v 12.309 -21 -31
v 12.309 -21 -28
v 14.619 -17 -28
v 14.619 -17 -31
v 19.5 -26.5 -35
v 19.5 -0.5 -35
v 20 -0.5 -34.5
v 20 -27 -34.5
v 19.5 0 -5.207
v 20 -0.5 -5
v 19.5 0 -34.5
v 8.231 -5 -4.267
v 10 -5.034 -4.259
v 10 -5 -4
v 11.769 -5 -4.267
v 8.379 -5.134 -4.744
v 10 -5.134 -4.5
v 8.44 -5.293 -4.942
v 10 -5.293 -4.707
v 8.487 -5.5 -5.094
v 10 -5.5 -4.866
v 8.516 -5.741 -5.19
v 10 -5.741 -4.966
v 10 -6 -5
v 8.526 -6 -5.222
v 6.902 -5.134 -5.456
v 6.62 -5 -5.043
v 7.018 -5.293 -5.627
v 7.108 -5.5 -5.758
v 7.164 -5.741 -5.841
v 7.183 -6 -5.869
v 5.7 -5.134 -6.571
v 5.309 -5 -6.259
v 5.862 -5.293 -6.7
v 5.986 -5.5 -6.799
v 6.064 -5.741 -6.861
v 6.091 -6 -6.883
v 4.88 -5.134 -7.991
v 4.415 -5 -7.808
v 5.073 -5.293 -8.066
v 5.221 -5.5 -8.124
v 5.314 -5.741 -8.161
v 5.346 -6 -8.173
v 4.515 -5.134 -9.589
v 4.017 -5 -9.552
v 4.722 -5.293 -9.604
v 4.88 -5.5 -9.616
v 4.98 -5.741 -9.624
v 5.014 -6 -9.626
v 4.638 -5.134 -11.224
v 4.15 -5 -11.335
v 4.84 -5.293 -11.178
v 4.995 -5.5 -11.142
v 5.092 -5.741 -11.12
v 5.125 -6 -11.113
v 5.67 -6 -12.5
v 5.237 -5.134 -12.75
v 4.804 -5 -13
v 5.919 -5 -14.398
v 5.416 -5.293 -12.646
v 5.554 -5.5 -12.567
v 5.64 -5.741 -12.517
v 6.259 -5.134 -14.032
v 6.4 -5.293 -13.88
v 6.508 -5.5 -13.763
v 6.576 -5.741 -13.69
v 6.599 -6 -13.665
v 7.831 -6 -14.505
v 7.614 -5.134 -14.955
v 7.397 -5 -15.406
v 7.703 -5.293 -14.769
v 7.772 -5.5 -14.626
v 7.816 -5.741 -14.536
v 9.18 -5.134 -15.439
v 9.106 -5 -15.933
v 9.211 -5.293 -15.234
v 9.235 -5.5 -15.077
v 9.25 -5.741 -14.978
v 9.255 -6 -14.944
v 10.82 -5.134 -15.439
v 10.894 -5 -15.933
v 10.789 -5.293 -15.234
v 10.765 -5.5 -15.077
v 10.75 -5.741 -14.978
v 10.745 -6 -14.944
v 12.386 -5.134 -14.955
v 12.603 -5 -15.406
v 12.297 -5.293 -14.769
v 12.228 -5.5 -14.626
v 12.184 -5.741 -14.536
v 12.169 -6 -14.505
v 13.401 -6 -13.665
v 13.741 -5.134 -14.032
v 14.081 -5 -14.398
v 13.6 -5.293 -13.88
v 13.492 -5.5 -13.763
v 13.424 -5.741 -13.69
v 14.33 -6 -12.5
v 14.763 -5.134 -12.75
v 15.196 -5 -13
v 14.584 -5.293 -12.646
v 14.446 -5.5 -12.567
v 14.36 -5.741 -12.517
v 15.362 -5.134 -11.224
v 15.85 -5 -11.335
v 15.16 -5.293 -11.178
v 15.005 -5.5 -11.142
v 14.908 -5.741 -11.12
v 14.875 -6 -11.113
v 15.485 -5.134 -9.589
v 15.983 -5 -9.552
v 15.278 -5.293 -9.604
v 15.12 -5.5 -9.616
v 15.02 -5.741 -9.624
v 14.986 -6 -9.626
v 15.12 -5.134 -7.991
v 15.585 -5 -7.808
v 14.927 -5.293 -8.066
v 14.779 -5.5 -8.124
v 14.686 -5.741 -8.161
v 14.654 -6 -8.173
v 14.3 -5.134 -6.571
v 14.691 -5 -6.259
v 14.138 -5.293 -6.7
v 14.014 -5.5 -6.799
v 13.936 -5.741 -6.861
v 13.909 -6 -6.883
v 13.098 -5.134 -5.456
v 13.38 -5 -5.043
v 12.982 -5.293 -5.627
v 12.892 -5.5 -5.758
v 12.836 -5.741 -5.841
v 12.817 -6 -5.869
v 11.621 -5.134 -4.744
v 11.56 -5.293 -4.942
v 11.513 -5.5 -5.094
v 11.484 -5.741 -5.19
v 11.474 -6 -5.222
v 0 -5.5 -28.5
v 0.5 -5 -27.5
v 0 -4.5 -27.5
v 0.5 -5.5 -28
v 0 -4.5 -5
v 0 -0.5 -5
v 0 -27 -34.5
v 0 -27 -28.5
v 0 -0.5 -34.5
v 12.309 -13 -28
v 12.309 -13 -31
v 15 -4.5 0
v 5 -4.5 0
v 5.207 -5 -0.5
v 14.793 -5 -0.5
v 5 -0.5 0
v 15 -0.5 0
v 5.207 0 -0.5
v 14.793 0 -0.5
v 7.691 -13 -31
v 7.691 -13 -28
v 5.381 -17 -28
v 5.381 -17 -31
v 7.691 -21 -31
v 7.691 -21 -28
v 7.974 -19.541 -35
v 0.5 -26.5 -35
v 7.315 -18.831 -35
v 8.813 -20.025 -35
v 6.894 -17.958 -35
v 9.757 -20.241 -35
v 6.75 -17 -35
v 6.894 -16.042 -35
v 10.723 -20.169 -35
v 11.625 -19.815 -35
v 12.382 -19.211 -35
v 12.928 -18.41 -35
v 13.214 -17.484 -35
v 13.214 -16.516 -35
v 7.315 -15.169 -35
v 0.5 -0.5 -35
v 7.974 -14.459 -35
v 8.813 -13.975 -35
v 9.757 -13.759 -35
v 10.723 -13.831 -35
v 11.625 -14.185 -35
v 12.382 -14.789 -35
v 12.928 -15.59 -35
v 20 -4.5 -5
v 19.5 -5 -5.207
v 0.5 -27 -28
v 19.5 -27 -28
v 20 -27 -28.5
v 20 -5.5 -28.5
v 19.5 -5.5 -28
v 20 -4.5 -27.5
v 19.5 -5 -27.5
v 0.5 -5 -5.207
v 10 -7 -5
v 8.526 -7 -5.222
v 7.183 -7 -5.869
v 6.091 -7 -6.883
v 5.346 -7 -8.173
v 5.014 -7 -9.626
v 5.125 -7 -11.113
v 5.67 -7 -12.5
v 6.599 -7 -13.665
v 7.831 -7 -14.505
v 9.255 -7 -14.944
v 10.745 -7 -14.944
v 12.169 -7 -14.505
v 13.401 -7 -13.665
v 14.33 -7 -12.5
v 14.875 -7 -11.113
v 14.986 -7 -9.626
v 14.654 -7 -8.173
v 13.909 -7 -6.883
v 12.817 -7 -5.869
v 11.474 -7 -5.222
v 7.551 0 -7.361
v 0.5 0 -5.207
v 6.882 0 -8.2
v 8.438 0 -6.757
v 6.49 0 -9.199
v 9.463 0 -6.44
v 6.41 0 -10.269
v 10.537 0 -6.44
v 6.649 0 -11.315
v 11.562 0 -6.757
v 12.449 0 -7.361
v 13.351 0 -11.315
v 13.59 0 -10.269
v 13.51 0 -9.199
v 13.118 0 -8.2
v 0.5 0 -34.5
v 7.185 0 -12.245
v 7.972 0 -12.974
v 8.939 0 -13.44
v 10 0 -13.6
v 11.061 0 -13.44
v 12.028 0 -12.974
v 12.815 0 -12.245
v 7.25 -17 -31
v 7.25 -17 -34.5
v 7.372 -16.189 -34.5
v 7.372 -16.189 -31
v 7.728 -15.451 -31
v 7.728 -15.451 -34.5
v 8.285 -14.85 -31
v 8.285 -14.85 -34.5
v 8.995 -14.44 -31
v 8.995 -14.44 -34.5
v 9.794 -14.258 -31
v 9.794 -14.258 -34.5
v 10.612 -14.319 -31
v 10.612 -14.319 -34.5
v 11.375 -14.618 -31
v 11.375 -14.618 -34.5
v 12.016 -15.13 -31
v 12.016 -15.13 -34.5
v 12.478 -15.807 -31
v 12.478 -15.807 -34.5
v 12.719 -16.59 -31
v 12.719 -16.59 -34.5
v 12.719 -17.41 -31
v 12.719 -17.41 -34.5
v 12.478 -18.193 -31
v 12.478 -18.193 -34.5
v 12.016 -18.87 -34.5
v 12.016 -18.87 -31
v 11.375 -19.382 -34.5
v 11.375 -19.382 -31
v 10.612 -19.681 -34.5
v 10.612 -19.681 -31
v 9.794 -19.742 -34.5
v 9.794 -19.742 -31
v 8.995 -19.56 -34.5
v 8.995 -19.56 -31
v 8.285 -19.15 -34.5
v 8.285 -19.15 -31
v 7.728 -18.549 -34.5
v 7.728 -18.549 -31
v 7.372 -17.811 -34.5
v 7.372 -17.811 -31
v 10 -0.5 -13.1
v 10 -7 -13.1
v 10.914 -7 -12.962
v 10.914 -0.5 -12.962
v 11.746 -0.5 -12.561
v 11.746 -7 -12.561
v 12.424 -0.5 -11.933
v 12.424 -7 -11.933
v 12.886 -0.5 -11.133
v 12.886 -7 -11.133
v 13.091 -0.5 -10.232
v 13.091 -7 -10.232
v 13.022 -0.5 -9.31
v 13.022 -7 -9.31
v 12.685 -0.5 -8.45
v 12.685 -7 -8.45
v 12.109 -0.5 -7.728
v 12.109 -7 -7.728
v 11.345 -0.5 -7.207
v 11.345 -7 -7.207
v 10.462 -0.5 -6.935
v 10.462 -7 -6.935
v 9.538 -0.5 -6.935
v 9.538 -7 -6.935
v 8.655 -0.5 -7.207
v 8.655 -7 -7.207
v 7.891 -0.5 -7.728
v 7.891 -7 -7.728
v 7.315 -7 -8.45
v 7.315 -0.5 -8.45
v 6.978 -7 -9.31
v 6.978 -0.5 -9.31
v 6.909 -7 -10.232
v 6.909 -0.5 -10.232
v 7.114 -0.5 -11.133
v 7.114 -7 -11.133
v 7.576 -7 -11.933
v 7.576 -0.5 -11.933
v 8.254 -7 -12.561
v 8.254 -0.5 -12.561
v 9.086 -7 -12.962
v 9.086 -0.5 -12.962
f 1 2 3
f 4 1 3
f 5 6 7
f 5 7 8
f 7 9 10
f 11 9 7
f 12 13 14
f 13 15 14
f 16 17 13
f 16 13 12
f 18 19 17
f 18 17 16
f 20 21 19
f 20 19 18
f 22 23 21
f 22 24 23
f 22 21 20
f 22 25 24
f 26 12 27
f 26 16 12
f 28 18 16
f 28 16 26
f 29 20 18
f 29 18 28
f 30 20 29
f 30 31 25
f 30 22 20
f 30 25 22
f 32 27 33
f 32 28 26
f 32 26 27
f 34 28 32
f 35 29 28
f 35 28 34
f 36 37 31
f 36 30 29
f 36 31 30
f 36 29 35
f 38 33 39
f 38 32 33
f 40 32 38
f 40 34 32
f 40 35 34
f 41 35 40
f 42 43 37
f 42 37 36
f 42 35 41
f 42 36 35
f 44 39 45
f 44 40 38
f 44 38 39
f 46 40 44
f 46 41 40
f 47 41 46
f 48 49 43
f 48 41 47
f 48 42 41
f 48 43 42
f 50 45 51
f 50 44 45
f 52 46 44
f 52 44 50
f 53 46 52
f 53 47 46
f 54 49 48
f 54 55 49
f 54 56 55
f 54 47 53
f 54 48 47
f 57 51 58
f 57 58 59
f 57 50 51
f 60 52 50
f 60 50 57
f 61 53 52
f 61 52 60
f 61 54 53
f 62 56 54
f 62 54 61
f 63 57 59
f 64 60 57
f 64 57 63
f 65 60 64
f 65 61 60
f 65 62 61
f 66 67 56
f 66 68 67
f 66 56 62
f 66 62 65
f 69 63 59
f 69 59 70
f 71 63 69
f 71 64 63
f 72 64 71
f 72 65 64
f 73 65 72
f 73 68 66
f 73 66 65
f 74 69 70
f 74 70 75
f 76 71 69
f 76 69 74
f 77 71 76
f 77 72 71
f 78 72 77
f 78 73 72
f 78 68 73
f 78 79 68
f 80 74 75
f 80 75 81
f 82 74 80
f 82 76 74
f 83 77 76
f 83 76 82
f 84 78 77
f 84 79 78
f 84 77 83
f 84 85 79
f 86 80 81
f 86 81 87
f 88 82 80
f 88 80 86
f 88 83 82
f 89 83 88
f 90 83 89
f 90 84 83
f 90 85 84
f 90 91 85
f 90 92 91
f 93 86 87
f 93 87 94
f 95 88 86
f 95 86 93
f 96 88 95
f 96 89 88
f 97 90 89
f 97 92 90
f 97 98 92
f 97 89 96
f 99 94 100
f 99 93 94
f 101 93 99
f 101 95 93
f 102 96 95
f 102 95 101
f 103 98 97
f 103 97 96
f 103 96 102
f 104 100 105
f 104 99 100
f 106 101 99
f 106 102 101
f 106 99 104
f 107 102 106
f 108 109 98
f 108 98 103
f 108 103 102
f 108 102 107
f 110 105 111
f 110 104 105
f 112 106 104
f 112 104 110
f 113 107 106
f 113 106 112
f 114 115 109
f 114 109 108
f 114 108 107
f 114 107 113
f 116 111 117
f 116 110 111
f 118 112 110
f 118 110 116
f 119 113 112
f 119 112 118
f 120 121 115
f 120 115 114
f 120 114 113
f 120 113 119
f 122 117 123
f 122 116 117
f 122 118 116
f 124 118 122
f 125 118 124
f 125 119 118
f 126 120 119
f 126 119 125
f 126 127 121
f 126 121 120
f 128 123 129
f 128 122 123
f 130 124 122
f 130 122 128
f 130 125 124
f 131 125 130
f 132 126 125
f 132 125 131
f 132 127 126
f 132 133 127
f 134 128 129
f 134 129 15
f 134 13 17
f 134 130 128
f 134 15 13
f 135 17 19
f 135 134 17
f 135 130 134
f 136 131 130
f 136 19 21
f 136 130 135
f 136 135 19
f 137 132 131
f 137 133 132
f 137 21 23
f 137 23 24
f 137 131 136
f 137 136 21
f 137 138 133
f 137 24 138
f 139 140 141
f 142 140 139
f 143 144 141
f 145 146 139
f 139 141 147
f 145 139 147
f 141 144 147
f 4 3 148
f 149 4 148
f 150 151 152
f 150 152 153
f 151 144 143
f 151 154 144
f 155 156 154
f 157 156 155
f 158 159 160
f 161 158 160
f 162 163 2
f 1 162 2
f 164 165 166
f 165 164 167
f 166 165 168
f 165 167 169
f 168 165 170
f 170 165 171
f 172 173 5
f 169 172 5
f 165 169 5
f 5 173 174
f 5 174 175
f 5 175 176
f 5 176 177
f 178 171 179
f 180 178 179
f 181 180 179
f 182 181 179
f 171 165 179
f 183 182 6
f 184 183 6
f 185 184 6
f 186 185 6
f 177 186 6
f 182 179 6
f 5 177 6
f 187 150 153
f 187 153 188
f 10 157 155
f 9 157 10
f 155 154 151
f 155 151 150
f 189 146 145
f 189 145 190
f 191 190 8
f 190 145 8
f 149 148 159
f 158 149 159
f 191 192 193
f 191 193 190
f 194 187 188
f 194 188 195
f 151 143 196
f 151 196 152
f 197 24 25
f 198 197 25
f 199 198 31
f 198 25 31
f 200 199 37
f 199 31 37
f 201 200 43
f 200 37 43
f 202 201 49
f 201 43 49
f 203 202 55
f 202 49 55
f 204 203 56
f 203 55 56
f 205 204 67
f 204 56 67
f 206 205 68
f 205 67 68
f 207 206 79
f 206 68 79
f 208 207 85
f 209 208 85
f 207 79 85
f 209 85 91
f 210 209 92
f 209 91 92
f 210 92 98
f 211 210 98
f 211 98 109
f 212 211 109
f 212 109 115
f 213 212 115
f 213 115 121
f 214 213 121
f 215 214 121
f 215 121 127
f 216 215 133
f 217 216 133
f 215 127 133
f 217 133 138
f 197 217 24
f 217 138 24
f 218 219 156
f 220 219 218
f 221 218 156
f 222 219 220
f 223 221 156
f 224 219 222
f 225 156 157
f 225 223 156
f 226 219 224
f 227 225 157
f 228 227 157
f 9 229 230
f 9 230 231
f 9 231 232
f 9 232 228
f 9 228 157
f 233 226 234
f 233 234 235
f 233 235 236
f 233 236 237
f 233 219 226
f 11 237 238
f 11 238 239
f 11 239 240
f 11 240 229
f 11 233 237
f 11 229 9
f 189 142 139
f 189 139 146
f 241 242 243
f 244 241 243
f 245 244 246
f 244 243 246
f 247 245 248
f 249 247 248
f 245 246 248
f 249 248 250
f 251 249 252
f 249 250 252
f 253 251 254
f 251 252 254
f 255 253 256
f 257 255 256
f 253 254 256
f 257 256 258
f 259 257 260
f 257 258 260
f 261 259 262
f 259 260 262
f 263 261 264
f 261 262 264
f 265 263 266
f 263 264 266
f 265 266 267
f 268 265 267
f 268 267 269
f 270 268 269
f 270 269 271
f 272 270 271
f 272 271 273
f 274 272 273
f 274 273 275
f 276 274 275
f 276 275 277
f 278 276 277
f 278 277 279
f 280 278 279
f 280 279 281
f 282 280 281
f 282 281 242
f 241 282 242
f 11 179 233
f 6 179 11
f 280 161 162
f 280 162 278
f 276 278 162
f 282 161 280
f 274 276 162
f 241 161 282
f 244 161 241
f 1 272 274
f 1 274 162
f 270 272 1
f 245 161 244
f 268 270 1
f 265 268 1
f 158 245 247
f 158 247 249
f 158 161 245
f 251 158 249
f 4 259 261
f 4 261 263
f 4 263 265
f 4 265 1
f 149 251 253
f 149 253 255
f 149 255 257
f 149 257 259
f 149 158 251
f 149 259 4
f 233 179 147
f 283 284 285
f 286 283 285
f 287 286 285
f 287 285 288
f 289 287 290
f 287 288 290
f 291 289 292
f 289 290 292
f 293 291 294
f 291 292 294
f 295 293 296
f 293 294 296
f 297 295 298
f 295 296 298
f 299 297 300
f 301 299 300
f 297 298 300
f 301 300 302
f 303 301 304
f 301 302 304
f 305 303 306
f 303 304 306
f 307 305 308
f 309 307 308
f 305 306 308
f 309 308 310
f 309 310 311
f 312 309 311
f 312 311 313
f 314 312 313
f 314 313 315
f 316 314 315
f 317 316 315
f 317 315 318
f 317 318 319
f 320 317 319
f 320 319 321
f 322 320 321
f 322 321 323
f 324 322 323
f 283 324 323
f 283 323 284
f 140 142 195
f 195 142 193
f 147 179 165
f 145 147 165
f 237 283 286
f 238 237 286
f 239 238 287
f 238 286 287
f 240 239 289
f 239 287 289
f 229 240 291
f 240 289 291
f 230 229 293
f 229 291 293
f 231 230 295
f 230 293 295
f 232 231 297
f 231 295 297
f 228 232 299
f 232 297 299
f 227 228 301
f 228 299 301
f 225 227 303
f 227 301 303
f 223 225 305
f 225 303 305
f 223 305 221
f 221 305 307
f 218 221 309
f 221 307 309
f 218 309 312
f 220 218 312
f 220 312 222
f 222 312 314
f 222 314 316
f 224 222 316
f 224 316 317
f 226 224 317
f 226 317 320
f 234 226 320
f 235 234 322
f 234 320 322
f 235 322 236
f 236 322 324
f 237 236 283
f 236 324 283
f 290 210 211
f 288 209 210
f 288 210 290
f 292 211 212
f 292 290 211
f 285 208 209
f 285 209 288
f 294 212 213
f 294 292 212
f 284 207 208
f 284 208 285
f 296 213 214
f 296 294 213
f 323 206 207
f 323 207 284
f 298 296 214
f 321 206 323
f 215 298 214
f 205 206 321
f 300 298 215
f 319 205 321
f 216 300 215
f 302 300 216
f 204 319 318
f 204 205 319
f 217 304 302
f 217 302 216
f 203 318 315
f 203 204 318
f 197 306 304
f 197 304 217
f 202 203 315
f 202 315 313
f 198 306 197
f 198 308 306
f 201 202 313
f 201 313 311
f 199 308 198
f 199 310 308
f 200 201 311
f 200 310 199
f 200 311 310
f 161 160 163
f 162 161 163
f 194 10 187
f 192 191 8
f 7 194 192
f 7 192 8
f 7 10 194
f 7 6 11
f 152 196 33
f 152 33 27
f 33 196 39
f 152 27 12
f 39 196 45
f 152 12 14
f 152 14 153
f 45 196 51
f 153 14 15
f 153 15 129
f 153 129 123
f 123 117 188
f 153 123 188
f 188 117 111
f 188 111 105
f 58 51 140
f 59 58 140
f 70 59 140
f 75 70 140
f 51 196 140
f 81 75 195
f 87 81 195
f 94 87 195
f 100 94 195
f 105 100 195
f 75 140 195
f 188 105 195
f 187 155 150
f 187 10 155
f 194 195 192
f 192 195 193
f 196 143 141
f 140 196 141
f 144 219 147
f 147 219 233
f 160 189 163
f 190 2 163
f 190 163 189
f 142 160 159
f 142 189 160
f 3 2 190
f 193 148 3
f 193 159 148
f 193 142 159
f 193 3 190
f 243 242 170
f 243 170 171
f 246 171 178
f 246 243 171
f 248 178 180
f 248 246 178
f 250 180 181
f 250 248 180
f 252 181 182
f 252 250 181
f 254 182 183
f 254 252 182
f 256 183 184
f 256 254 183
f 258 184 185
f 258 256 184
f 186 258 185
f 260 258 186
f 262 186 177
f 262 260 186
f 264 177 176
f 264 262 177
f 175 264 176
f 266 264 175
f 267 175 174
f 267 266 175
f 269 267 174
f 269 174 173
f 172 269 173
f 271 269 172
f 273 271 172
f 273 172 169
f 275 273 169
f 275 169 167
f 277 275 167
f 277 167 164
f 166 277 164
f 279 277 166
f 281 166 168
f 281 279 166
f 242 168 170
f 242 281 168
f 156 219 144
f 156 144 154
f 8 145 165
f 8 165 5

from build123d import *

# Parameters (mm, degrees)
SKETCH_1_W          = 20
SKETCH_1_H          = 28
EXTRUDE_1_DEPTH     = 5
SKETCH_1_3_W        = 20
SKETCH_1_3_H        = 7
EXTRUDE_2_DEPTH     = 27
SKETCH_2_R          = 5
EXTRUDE_3_DEPTH     = 2
SKETCH_5_R          = 2.75
CUT_EXTRUDE_2_DEPTH = 49.518037883
FILLET_1_R          = 1
SKETCH_6_R          = 3.1
CUT_EXTRUDE_3_DEPTH = 46
CUT_EXTRUDE_4_DEPTH = 3
CHAMFER_1_SIZE      = 5
CHAMFER_2_SIZE      = 0.5


with BuildPart() as part:
    # 草图1 → 凸台-拉伸1 (new body)
    with BuildSketch(Plane(origin=(0, 0, 0), x_dir=(1, 0, 0), z_dir=(0, 1, 0))):
        with Locations((10, 14)):
            Rectangle(SKETCH_1_W, SKETCH_1_H)
    extrude(amount=-EXTRUDE_1_DEPTH)

    # 草图1<3> → 凸台-拉伸2 (add)
    with BuildSketch(Plane(origin=(0, 0, 0), x_dir=(1, 0, 0), z_dir=(0, 1, 0))):
        with Locations((10, 31.5)):
            Rectangle(SKETCH_1_3_W, SKETCH_1_3_H)
    extrude(amount=-EXTRUDE_2_DEPTH)

    # 草图2 → 凸台-拉伸3 (add)
    with BuildSketch(Plane.XZ.offset(5)):
        with Locations(Location((10, -10, 0), (0, 0, 90))):
            Circle(SKETCH_2_R)
    extrude(amount=EXTRUDE_3_DEPTH)

    # 草图5 → 切除-拉伸2 (cut, through all)
    with BuildSketch(Plane(origin=(0, 0, -35), x_dir=(-1, 0, 0), z_dir=(0, 0, -1))):
        with Locations((-10, -17)):
            Circle(SKETCH_5_R)
    extrude(amount=-CUT_EXTRUDE_2_DEPTH, mode=Mode.SUBTRACT)

    # 圆角1
    fillet_1_edges = [part.edges().sort_by_distance(p)[0] for p in [
        (10, -5, -15),
    ]]
    fillet(fillet_1_edges, radius=FILLET_1_R)

    # 草图6 → 切除-拉伸3 (cut, through all)
    with BuildSketch(Plane.XZ.offset(7)):
        with Locations(Location((10, -10, 0), (0, 0, 270))):
            Circle(SKETCH_6_R)
    extrude(amount=-CUT_EXTRUDE_3_DEPTH, mode=Mode.SUBTRACT)

    # 草图7 → 切除-拉伸4 (cut)
    with BuildSketch(Plane.XY.offset(-28)):
        Polygon((14.618802154, -17), (12.309401077, -13), (7.690598923, -13), (5.381197846, -17), (7.690598923, -21), (12.309401077, -21), align=None)
    extrude(amount=-CUT_EXTRUDE_4_DEPTH, mode=Mode.SUBTRACT)

    # 倒角1
    chamfer_1_edges = [part.edges().sort_by_distance(p)[0] for p in [
        (0, -2.5, 0),
        (20, -2.5, 0),
    ]]
    chamfer(chamfer_1_edges, length=CHAMFER_1_SIZE)

    # 倒角2
    chamfer_2_edges = [part.edges().sort_by_distance(p)[0] for p in [
        (20, -16, -28),
        (0, -16, -28),
        (10, 0, -35),
        (10, -5, -28),
        (0, -13.5, -35),
        (20, -13.5, -35),
        (10, -27, -35),
        (12.75, -17, -35),
        (10, 0, -6.9),
        (10, 0, 0),
        (10, -5, 0),
        (20, 0, -20),
        (0, 0, -20),
        (2.5, 0, -2.5),
        (17.5, 0, -2.5),
        (20, -5, -16.5),
        (0, -5, -16.5),
        (2.5, -5, -2.5),
        (17.5, -5, -2.5),
    ]]
    chamfer(chamfer_2_edges, length=CHAMFER_2_SIZE)


solid = part.part
